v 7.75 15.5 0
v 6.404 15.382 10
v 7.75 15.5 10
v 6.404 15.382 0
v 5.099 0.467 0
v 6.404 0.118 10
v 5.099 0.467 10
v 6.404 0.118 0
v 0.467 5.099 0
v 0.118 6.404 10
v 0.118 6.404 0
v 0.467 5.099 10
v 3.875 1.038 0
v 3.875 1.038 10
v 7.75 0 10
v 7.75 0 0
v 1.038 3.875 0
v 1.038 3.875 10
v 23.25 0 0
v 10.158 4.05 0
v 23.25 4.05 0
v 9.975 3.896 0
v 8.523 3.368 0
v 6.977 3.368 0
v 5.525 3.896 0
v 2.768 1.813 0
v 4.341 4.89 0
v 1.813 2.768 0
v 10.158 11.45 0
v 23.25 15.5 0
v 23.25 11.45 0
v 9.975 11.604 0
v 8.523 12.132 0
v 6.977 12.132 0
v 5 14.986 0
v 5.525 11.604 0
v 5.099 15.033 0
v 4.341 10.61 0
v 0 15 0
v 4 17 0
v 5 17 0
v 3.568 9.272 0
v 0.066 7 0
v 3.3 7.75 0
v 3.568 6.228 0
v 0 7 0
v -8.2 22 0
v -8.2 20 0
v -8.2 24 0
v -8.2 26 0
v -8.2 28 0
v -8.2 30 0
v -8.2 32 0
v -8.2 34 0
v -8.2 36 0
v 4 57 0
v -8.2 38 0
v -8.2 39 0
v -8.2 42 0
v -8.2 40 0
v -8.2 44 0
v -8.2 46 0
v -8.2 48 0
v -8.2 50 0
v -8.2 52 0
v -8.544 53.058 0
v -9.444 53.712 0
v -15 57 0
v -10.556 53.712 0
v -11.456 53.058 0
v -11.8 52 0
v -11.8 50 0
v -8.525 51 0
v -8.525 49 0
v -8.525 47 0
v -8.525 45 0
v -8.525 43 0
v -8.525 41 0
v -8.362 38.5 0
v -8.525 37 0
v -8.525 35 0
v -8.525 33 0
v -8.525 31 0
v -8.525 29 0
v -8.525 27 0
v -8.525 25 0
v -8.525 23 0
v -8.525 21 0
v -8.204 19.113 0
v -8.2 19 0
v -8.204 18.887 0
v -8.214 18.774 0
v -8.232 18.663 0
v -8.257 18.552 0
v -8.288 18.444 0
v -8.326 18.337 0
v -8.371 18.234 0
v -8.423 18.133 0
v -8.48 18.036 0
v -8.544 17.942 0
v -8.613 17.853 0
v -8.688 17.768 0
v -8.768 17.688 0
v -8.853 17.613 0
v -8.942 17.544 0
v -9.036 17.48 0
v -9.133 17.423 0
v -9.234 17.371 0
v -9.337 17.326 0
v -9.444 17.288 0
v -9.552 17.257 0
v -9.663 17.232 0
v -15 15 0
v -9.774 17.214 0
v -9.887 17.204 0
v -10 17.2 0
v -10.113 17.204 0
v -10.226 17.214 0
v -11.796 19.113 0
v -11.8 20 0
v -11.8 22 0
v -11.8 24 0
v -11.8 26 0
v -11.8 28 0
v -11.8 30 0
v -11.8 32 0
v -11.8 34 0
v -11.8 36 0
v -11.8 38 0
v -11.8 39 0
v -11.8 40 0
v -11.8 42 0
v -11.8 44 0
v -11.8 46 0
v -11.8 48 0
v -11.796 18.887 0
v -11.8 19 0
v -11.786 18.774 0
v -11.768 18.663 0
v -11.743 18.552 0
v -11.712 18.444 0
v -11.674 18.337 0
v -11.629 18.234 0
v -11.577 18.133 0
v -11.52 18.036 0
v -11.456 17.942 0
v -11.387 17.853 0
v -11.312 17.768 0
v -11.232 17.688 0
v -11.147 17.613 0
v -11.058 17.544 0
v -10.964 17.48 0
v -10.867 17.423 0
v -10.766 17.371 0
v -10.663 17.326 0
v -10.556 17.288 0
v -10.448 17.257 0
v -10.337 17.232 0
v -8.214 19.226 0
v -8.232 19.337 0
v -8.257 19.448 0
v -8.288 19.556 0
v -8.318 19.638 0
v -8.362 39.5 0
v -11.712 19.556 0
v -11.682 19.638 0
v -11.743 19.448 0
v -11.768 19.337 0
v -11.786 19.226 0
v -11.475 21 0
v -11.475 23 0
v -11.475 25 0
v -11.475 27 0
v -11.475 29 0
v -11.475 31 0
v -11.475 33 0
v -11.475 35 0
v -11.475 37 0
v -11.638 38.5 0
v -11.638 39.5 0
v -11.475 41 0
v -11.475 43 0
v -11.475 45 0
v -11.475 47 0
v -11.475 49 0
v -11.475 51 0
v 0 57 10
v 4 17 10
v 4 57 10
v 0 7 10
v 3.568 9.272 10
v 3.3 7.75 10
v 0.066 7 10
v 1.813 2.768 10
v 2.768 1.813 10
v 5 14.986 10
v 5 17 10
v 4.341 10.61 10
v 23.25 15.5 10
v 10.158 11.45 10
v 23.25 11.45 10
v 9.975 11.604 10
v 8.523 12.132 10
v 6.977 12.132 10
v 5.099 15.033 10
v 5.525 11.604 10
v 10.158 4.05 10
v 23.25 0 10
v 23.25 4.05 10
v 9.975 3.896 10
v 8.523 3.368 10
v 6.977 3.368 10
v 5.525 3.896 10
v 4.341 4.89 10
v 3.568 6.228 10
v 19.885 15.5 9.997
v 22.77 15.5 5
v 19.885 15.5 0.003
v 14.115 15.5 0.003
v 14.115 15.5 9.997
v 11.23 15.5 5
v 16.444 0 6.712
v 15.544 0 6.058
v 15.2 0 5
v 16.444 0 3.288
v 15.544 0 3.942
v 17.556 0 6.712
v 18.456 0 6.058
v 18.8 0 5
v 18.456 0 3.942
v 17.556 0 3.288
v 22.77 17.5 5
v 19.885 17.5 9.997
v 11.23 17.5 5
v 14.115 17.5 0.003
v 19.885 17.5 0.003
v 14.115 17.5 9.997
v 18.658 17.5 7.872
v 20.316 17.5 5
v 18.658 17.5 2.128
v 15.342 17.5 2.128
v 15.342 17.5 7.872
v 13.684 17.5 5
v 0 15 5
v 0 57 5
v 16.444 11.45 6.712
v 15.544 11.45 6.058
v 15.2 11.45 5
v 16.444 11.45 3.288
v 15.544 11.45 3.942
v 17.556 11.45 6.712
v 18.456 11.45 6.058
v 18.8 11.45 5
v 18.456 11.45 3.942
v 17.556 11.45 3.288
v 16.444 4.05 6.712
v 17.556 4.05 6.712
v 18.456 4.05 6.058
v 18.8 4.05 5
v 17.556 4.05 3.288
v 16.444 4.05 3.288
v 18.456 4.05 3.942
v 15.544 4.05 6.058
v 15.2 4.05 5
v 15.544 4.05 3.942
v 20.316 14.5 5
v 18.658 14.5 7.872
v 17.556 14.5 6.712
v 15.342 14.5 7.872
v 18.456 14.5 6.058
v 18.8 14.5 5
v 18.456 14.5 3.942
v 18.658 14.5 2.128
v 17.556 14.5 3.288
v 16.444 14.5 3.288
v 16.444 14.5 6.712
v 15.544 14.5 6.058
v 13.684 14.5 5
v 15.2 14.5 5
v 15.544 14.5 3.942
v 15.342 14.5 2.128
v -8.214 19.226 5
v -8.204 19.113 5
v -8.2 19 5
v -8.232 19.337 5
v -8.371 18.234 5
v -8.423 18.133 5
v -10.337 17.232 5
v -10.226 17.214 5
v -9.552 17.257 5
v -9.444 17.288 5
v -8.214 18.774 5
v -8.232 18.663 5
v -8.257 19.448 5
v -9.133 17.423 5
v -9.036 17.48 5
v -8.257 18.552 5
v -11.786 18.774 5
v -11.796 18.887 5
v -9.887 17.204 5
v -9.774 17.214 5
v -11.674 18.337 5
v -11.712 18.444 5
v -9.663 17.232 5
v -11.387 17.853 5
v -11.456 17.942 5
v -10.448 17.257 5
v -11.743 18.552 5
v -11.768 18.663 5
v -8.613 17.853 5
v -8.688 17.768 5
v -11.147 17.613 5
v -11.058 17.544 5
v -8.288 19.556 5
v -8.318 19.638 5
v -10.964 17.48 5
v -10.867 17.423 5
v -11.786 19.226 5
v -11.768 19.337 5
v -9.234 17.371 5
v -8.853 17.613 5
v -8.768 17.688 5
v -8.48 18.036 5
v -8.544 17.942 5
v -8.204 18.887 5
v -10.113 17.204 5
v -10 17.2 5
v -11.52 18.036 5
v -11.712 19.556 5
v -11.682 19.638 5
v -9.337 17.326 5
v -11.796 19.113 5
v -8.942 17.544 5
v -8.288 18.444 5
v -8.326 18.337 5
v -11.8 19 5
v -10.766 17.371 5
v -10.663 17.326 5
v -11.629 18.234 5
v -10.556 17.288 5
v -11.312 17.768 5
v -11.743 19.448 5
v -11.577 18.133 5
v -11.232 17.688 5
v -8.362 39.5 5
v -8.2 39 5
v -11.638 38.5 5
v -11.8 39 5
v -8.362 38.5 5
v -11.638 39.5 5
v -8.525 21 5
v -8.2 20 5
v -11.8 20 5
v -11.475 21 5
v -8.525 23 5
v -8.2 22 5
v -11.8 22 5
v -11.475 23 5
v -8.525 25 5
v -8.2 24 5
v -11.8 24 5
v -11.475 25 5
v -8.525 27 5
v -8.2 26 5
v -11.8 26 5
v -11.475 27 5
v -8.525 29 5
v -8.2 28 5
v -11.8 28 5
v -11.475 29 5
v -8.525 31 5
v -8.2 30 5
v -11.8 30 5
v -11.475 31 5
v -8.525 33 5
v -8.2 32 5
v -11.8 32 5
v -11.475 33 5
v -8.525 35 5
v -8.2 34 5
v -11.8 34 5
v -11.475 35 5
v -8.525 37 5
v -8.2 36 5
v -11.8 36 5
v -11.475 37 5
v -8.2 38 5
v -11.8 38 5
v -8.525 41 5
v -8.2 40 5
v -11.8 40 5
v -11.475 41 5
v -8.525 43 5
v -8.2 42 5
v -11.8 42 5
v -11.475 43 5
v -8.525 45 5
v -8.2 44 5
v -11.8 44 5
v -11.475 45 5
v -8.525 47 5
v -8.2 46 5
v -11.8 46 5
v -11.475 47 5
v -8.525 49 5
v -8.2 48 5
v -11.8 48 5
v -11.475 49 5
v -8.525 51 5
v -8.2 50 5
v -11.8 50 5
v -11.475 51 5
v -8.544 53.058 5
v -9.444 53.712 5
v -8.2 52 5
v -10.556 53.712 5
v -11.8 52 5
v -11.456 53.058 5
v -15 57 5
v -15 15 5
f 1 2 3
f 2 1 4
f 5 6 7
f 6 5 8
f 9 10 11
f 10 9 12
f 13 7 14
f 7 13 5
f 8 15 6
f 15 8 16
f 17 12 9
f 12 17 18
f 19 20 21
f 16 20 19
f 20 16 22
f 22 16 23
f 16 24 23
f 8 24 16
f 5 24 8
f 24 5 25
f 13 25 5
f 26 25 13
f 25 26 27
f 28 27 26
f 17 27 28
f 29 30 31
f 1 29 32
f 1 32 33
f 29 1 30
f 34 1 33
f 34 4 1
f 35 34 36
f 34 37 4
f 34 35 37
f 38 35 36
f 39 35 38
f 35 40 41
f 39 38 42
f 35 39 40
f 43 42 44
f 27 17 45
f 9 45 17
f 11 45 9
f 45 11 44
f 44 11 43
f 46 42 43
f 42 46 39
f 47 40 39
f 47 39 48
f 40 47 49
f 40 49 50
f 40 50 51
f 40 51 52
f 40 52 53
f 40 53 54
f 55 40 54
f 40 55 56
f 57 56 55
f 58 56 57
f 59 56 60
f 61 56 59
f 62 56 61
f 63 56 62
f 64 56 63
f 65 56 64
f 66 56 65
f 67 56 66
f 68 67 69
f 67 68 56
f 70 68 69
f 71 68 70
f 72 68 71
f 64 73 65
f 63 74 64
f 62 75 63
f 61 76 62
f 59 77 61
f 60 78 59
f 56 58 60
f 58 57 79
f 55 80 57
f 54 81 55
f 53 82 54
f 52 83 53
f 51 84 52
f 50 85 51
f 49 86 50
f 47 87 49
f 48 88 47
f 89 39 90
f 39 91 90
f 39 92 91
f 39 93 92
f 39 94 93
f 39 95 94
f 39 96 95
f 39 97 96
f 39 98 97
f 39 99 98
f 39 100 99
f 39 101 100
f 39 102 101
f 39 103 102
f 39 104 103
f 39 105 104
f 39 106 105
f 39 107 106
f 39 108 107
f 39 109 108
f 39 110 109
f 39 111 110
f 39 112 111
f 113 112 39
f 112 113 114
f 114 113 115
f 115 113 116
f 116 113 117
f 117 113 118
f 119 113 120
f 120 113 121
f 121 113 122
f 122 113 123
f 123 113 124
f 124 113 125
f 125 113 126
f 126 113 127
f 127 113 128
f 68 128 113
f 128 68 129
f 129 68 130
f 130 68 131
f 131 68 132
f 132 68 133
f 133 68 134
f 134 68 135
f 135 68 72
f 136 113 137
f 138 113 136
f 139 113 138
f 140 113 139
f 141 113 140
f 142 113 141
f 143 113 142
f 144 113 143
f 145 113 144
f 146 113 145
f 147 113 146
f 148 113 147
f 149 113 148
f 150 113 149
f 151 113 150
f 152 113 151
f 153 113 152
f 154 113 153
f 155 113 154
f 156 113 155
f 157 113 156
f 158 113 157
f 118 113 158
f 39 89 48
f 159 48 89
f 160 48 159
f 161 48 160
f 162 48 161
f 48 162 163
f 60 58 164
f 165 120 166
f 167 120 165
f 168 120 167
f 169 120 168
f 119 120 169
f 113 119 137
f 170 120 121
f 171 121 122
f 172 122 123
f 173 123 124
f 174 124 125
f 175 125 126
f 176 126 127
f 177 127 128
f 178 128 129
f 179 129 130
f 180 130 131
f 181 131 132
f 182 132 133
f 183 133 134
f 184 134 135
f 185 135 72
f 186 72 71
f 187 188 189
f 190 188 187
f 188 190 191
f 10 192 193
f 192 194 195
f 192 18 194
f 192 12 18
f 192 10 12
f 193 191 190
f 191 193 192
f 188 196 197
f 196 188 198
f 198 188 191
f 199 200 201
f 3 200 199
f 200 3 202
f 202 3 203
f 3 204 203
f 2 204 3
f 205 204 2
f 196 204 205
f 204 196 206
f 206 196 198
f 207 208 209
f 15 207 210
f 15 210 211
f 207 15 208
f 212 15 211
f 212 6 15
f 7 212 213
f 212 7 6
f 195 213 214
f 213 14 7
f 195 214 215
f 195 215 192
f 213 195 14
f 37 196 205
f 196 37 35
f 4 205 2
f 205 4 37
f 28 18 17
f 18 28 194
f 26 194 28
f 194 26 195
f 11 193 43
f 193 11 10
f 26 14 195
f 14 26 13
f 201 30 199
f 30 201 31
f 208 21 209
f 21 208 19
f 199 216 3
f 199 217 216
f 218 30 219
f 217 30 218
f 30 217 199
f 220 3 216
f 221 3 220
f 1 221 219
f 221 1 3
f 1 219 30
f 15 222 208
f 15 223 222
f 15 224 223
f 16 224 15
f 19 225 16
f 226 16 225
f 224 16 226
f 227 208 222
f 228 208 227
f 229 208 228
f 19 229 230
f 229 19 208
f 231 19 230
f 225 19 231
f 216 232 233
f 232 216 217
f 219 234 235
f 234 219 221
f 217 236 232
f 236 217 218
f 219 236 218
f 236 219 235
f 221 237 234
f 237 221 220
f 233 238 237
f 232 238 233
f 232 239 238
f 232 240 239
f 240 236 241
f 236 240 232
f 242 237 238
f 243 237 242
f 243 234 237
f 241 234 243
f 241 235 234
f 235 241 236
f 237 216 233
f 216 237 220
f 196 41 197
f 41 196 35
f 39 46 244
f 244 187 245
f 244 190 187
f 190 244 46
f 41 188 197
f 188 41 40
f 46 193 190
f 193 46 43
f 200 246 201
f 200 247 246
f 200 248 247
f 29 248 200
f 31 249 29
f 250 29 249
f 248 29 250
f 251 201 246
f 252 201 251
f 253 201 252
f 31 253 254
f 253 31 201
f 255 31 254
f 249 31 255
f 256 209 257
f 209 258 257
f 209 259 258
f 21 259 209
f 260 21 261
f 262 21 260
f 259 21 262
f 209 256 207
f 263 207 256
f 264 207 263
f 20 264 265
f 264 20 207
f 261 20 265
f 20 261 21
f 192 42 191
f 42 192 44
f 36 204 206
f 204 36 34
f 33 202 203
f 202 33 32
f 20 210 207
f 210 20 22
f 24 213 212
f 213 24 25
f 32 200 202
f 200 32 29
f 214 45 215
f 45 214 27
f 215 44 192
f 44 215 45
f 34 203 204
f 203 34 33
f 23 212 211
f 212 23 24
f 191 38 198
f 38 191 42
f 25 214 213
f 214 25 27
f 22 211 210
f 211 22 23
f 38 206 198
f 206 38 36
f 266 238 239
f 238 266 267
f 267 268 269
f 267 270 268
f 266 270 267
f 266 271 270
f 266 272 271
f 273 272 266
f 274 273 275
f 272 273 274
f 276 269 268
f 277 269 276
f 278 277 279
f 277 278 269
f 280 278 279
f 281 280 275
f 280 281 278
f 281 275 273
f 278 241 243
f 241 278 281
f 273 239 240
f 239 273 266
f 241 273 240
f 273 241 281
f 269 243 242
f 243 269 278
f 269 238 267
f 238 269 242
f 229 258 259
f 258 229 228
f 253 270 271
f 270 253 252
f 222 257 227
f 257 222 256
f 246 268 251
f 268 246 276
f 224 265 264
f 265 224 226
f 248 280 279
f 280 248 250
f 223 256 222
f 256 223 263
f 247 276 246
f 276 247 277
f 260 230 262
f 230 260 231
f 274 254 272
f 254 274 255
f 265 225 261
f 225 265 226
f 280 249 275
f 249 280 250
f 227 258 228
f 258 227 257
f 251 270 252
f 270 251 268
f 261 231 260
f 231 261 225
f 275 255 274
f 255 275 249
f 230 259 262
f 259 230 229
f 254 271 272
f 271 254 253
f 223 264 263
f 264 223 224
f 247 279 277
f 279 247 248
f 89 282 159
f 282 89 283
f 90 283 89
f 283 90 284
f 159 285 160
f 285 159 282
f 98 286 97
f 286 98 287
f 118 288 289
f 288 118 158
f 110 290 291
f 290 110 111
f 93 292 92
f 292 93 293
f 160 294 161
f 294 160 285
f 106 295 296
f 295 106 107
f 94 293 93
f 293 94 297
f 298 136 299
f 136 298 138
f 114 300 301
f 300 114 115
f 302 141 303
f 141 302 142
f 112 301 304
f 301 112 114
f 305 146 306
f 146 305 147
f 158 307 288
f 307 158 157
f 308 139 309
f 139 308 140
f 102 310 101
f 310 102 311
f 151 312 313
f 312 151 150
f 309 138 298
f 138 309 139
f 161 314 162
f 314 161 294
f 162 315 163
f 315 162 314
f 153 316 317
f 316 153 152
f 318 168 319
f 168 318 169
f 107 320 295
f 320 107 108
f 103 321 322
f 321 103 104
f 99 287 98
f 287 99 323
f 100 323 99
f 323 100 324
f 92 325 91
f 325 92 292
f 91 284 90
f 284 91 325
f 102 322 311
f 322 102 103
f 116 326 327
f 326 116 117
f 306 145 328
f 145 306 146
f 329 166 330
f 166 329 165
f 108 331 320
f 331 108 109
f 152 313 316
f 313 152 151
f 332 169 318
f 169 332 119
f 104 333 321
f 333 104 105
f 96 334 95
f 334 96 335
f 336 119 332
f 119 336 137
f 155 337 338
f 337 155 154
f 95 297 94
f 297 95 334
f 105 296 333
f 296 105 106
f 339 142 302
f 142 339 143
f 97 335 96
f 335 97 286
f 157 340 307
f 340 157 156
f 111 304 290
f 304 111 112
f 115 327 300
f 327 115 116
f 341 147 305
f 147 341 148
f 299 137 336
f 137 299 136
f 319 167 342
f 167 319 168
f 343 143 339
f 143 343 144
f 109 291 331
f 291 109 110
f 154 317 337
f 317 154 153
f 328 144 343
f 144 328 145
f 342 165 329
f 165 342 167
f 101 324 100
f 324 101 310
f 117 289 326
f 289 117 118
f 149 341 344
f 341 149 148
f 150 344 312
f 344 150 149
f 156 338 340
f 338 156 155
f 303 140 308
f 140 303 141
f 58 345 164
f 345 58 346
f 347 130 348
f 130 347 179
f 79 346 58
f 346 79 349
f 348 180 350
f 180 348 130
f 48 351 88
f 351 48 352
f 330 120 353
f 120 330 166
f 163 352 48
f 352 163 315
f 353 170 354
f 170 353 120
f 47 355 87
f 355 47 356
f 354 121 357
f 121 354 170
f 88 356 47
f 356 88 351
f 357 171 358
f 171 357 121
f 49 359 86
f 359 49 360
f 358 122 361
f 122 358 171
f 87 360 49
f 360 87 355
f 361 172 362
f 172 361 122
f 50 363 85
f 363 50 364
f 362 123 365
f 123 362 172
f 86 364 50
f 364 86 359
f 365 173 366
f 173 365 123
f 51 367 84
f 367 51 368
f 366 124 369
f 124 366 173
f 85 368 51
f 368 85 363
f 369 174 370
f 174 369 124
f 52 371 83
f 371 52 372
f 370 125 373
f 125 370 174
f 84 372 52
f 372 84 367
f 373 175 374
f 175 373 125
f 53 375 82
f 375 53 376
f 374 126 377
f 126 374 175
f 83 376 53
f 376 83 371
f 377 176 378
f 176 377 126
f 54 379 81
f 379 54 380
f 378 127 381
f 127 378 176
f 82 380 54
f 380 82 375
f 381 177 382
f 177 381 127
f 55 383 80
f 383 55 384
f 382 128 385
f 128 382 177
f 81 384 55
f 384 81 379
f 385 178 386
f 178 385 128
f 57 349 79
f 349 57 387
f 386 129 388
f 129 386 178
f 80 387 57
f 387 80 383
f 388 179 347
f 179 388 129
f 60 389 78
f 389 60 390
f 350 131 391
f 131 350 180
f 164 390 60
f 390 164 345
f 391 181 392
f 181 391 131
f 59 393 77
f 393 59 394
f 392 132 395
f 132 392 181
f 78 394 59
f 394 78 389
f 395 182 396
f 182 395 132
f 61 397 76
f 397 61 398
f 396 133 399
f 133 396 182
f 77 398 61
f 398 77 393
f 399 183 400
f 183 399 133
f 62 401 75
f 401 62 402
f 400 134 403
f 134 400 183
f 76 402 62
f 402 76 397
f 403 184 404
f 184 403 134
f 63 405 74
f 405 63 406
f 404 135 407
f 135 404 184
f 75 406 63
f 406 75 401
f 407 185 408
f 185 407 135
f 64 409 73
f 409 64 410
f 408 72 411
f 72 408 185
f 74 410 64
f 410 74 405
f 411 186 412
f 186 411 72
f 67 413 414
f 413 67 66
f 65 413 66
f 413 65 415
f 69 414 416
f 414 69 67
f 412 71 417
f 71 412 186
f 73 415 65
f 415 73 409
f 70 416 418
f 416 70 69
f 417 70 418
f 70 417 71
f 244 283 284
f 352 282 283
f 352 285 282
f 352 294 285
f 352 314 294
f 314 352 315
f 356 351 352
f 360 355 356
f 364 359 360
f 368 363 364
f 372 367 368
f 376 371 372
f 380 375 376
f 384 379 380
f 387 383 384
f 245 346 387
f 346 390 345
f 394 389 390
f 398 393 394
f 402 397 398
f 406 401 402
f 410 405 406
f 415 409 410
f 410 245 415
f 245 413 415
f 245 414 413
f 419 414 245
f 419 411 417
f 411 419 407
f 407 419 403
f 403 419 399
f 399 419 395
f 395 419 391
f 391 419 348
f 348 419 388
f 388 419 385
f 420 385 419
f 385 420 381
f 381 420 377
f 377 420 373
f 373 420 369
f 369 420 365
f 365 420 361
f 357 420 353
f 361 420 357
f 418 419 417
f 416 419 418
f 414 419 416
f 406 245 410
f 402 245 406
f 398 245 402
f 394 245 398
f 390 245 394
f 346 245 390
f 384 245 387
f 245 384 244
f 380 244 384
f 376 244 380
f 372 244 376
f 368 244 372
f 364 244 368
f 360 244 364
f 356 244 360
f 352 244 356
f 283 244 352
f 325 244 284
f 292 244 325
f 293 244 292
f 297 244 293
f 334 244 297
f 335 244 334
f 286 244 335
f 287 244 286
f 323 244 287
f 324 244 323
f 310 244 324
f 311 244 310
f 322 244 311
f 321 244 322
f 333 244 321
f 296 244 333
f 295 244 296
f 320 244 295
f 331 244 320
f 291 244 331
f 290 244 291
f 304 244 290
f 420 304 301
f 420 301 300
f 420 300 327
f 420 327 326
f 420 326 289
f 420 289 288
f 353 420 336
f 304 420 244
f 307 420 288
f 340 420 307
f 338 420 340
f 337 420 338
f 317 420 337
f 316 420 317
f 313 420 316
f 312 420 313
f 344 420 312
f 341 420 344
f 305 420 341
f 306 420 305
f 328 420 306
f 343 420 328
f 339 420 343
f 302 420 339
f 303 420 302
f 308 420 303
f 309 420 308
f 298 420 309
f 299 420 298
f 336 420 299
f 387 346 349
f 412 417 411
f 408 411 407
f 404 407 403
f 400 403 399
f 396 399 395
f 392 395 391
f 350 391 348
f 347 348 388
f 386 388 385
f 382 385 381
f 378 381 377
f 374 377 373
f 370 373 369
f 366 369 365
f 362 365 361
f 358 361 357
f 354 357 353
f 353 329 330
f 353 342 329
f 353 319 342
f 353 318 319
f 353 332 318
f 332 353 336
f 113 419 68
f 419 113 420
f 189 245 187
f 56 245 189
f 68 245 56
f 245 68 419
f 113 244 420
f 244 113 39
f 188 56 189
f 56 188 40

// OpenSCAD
// PRUSA Mendel  
// X-Endstop holder
// Used to attach endstop to 8mm X-rods
// GNU GPL v3
// Josef Průša
// josefprusa@me.com
// prusadjs.cz
// modified version creation Coen Roos 14 dec. 2012
// modified version creation Robert Moro 16 dec. 2012


/**
 * @id X-endstop-holder
 * @name X-Endstop holder
 * @category Printed
 * @using 1 m3x20xhex
 * @using 1 m3nut
 * @using 2 m3washer
 */

m3_nut_diameter_horizontal = 6.3;
m8_diameter=8.9;
m3_diameter=3.6;
outer_diameter = m8_diameter/2+3.3;
opening_size = m8_diameter-1.5; //openingsize



module endstop()
{

	// Rodclamp)
	rodclamp(0);

	// Rodclamp
 	//rotate(a=180, v=[1,0,0]) translate([0,-61,-10]) rodclamp(1);

	// Bridge between rodclamps
	translate([0,15,0])
	{
			cube([4,42,10]);


		difference()
		{

			translate([-15,0,0]) {
			cube([15,42,5]);
			}
			// Holes for endstop switch
			union()
			{
				translate([-10,4,0])
				{
					cylinder(h =120, r = m3_diameter/2, $fn = 100);
					translate([0,20,0])cylinder(h =12, r = m3_diameter/2, $fn = 10);
				}
					//cylinder(h =120, r = m3_diameter/1, $fn = 100);
					translate([-10,5,0])cylinder(h =12, r = m3_diameter/2, $fn = 10);
					translate([-10,7,0])cylinder(h =12, r = m3_diameter/2, $fn = 10);
					translate([-10,9,0])cylinder(h =12, r = m3_diameter/2, $fn = 10);
					translate([-10,11,0])cylinder(h =12, r = m3_diameter/2, $fn = 10);
					translate([-10,13,0])cylinder(h =12, r = m3_diameter/2, $fn = 10);
					translate([-10,15,0])cylinder(h =12, r = m3_diameter/2, $fn = 10);
					translate([-10,17,0])cylinder(h =12, r = m3_diameter/2, $fn = 10);
					translate([-10,19,0])cylinder(h =12, r = m3_diameter/2, $fn = 10);
					translate([-10,21,0])cylinder(h =12, r = m3_diameter/2, $fn = 10);
					translate([-10,23,0])cylinder(h =12, r = m3_diameter/2, $fn = 10);
					translate([-10,25,0])cylinder(h =12, r = m3_diameter/2, $fn = 10);
					translate([-10,27,0])cylinder(h =12, r = m3_diameter/2, $fn = 10);
					translate([-10,29,0])cylinder(h =12, r = m3_diameter/2, $fn = 10);
					translate([-10,31,0])cylinder(h =12, r = m3_diameter/2, $fn = 10);
					translate([-10,33,0])cylinder(h =12, r = m3_diameter/2, $fn = 10);
					translate([-10,35,0])cylinder(h =12, r = m3_diameter/2, $fn = 10);
					translate([-10,37,0])cylinder(h =12, r = m3_diameter/2, $fn = 10);
			//cube([-5,32,5]);
			}
		}
	}

}

module rodclamp(switch)
{
 	difference()
	{
		union()
		{
			translate([outer_diameter, outer_diameter, 0]) cylinder(h =10, r = outer_diameter, $fn = 36);
			translate([outer_diameter, 0, 0]) cube([15.5,outer_diameter*2,10]);
			translate([17, 17.5, 5]) rotate([90, 0, 0]) cylinder(h =5, r = 5.77, $fn = 6);
			translate ([0,7,0]) cube([5,10,10]);
		}
		translate([9, outer_diameter-opening_size/2, -1]) cube([18,opening_size,20]);
		translate([outer_diameter, outer_diameter, -1]) cylinder(h =20, r = m8_diameter/2, $fn = 18);
		translate([17, 19.5, 5]) rotate([90, 0, 0]) cylinder(h =5, r = m3_nut_diameter_horizontal/1.9, $fn = 6);
		//Securing hole
		translate([17, 17, 5]) rotate([90, 0, 0]) cylinder(h =20, r = m3_diameter/2, $fn = 10);
	   }
}

endstop();
//rodclamp(0);
